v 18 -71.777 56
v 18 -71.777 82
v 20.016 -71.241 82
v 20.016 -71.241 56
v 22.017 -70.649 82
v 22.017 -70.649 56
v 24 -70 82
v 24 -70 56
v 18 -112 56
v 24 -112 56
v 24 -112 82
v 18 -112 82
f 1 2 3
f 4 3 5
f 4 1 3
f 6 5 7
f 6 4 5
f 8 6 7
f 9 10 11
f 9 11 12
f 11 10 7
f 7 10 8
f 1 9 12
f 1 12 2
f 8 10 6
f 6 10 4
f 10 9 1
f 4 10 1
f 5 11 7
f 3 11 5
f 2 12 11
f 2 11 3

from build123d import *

# Parameters (mm, degrees)
CYLINDER964_R          = 74
CYLINDER964_DEPTH      = 32
BOX476_W               = 50
BOX476_H               = 6
BOX476_DEPTH           = 26
CUT443_PLACEMENT_ANGLE = 90


with BuildPart() as v_lec964:
    # Cylinder964 → Cylinder964 (new body)
    with BuildSketch(Plane.XY.offset(50)):
        Circle(CYLINDER964_R)
    extrude(amount=CYLINDER964_DEPTH)


with BuildPart() as cut443:
    # Box476 → Box476 (new body)
    with BuildSketch(Plane(origin=(-112, -24, 56), x_dir=(1, 0, 0), z_dir=(0, 0, 1))):
        with Locations((25, 3)):
            Rectangle(BOX476_W, BOX476_H)
    extrude(amount=BOX476_DEPTH)

    # Cut443: cut Válec964
    add(v_lec964.part, mode=Mode.SUBTRACT)


with BuildPart() as cut443_1:
    # Cut443 placement: moved
    add(cut443.part.rotate(Axis((0, 0, 0), (0, 0, 1)), CUT443_PLACEMENT_ANGLE))


solid = cut443_1.part
